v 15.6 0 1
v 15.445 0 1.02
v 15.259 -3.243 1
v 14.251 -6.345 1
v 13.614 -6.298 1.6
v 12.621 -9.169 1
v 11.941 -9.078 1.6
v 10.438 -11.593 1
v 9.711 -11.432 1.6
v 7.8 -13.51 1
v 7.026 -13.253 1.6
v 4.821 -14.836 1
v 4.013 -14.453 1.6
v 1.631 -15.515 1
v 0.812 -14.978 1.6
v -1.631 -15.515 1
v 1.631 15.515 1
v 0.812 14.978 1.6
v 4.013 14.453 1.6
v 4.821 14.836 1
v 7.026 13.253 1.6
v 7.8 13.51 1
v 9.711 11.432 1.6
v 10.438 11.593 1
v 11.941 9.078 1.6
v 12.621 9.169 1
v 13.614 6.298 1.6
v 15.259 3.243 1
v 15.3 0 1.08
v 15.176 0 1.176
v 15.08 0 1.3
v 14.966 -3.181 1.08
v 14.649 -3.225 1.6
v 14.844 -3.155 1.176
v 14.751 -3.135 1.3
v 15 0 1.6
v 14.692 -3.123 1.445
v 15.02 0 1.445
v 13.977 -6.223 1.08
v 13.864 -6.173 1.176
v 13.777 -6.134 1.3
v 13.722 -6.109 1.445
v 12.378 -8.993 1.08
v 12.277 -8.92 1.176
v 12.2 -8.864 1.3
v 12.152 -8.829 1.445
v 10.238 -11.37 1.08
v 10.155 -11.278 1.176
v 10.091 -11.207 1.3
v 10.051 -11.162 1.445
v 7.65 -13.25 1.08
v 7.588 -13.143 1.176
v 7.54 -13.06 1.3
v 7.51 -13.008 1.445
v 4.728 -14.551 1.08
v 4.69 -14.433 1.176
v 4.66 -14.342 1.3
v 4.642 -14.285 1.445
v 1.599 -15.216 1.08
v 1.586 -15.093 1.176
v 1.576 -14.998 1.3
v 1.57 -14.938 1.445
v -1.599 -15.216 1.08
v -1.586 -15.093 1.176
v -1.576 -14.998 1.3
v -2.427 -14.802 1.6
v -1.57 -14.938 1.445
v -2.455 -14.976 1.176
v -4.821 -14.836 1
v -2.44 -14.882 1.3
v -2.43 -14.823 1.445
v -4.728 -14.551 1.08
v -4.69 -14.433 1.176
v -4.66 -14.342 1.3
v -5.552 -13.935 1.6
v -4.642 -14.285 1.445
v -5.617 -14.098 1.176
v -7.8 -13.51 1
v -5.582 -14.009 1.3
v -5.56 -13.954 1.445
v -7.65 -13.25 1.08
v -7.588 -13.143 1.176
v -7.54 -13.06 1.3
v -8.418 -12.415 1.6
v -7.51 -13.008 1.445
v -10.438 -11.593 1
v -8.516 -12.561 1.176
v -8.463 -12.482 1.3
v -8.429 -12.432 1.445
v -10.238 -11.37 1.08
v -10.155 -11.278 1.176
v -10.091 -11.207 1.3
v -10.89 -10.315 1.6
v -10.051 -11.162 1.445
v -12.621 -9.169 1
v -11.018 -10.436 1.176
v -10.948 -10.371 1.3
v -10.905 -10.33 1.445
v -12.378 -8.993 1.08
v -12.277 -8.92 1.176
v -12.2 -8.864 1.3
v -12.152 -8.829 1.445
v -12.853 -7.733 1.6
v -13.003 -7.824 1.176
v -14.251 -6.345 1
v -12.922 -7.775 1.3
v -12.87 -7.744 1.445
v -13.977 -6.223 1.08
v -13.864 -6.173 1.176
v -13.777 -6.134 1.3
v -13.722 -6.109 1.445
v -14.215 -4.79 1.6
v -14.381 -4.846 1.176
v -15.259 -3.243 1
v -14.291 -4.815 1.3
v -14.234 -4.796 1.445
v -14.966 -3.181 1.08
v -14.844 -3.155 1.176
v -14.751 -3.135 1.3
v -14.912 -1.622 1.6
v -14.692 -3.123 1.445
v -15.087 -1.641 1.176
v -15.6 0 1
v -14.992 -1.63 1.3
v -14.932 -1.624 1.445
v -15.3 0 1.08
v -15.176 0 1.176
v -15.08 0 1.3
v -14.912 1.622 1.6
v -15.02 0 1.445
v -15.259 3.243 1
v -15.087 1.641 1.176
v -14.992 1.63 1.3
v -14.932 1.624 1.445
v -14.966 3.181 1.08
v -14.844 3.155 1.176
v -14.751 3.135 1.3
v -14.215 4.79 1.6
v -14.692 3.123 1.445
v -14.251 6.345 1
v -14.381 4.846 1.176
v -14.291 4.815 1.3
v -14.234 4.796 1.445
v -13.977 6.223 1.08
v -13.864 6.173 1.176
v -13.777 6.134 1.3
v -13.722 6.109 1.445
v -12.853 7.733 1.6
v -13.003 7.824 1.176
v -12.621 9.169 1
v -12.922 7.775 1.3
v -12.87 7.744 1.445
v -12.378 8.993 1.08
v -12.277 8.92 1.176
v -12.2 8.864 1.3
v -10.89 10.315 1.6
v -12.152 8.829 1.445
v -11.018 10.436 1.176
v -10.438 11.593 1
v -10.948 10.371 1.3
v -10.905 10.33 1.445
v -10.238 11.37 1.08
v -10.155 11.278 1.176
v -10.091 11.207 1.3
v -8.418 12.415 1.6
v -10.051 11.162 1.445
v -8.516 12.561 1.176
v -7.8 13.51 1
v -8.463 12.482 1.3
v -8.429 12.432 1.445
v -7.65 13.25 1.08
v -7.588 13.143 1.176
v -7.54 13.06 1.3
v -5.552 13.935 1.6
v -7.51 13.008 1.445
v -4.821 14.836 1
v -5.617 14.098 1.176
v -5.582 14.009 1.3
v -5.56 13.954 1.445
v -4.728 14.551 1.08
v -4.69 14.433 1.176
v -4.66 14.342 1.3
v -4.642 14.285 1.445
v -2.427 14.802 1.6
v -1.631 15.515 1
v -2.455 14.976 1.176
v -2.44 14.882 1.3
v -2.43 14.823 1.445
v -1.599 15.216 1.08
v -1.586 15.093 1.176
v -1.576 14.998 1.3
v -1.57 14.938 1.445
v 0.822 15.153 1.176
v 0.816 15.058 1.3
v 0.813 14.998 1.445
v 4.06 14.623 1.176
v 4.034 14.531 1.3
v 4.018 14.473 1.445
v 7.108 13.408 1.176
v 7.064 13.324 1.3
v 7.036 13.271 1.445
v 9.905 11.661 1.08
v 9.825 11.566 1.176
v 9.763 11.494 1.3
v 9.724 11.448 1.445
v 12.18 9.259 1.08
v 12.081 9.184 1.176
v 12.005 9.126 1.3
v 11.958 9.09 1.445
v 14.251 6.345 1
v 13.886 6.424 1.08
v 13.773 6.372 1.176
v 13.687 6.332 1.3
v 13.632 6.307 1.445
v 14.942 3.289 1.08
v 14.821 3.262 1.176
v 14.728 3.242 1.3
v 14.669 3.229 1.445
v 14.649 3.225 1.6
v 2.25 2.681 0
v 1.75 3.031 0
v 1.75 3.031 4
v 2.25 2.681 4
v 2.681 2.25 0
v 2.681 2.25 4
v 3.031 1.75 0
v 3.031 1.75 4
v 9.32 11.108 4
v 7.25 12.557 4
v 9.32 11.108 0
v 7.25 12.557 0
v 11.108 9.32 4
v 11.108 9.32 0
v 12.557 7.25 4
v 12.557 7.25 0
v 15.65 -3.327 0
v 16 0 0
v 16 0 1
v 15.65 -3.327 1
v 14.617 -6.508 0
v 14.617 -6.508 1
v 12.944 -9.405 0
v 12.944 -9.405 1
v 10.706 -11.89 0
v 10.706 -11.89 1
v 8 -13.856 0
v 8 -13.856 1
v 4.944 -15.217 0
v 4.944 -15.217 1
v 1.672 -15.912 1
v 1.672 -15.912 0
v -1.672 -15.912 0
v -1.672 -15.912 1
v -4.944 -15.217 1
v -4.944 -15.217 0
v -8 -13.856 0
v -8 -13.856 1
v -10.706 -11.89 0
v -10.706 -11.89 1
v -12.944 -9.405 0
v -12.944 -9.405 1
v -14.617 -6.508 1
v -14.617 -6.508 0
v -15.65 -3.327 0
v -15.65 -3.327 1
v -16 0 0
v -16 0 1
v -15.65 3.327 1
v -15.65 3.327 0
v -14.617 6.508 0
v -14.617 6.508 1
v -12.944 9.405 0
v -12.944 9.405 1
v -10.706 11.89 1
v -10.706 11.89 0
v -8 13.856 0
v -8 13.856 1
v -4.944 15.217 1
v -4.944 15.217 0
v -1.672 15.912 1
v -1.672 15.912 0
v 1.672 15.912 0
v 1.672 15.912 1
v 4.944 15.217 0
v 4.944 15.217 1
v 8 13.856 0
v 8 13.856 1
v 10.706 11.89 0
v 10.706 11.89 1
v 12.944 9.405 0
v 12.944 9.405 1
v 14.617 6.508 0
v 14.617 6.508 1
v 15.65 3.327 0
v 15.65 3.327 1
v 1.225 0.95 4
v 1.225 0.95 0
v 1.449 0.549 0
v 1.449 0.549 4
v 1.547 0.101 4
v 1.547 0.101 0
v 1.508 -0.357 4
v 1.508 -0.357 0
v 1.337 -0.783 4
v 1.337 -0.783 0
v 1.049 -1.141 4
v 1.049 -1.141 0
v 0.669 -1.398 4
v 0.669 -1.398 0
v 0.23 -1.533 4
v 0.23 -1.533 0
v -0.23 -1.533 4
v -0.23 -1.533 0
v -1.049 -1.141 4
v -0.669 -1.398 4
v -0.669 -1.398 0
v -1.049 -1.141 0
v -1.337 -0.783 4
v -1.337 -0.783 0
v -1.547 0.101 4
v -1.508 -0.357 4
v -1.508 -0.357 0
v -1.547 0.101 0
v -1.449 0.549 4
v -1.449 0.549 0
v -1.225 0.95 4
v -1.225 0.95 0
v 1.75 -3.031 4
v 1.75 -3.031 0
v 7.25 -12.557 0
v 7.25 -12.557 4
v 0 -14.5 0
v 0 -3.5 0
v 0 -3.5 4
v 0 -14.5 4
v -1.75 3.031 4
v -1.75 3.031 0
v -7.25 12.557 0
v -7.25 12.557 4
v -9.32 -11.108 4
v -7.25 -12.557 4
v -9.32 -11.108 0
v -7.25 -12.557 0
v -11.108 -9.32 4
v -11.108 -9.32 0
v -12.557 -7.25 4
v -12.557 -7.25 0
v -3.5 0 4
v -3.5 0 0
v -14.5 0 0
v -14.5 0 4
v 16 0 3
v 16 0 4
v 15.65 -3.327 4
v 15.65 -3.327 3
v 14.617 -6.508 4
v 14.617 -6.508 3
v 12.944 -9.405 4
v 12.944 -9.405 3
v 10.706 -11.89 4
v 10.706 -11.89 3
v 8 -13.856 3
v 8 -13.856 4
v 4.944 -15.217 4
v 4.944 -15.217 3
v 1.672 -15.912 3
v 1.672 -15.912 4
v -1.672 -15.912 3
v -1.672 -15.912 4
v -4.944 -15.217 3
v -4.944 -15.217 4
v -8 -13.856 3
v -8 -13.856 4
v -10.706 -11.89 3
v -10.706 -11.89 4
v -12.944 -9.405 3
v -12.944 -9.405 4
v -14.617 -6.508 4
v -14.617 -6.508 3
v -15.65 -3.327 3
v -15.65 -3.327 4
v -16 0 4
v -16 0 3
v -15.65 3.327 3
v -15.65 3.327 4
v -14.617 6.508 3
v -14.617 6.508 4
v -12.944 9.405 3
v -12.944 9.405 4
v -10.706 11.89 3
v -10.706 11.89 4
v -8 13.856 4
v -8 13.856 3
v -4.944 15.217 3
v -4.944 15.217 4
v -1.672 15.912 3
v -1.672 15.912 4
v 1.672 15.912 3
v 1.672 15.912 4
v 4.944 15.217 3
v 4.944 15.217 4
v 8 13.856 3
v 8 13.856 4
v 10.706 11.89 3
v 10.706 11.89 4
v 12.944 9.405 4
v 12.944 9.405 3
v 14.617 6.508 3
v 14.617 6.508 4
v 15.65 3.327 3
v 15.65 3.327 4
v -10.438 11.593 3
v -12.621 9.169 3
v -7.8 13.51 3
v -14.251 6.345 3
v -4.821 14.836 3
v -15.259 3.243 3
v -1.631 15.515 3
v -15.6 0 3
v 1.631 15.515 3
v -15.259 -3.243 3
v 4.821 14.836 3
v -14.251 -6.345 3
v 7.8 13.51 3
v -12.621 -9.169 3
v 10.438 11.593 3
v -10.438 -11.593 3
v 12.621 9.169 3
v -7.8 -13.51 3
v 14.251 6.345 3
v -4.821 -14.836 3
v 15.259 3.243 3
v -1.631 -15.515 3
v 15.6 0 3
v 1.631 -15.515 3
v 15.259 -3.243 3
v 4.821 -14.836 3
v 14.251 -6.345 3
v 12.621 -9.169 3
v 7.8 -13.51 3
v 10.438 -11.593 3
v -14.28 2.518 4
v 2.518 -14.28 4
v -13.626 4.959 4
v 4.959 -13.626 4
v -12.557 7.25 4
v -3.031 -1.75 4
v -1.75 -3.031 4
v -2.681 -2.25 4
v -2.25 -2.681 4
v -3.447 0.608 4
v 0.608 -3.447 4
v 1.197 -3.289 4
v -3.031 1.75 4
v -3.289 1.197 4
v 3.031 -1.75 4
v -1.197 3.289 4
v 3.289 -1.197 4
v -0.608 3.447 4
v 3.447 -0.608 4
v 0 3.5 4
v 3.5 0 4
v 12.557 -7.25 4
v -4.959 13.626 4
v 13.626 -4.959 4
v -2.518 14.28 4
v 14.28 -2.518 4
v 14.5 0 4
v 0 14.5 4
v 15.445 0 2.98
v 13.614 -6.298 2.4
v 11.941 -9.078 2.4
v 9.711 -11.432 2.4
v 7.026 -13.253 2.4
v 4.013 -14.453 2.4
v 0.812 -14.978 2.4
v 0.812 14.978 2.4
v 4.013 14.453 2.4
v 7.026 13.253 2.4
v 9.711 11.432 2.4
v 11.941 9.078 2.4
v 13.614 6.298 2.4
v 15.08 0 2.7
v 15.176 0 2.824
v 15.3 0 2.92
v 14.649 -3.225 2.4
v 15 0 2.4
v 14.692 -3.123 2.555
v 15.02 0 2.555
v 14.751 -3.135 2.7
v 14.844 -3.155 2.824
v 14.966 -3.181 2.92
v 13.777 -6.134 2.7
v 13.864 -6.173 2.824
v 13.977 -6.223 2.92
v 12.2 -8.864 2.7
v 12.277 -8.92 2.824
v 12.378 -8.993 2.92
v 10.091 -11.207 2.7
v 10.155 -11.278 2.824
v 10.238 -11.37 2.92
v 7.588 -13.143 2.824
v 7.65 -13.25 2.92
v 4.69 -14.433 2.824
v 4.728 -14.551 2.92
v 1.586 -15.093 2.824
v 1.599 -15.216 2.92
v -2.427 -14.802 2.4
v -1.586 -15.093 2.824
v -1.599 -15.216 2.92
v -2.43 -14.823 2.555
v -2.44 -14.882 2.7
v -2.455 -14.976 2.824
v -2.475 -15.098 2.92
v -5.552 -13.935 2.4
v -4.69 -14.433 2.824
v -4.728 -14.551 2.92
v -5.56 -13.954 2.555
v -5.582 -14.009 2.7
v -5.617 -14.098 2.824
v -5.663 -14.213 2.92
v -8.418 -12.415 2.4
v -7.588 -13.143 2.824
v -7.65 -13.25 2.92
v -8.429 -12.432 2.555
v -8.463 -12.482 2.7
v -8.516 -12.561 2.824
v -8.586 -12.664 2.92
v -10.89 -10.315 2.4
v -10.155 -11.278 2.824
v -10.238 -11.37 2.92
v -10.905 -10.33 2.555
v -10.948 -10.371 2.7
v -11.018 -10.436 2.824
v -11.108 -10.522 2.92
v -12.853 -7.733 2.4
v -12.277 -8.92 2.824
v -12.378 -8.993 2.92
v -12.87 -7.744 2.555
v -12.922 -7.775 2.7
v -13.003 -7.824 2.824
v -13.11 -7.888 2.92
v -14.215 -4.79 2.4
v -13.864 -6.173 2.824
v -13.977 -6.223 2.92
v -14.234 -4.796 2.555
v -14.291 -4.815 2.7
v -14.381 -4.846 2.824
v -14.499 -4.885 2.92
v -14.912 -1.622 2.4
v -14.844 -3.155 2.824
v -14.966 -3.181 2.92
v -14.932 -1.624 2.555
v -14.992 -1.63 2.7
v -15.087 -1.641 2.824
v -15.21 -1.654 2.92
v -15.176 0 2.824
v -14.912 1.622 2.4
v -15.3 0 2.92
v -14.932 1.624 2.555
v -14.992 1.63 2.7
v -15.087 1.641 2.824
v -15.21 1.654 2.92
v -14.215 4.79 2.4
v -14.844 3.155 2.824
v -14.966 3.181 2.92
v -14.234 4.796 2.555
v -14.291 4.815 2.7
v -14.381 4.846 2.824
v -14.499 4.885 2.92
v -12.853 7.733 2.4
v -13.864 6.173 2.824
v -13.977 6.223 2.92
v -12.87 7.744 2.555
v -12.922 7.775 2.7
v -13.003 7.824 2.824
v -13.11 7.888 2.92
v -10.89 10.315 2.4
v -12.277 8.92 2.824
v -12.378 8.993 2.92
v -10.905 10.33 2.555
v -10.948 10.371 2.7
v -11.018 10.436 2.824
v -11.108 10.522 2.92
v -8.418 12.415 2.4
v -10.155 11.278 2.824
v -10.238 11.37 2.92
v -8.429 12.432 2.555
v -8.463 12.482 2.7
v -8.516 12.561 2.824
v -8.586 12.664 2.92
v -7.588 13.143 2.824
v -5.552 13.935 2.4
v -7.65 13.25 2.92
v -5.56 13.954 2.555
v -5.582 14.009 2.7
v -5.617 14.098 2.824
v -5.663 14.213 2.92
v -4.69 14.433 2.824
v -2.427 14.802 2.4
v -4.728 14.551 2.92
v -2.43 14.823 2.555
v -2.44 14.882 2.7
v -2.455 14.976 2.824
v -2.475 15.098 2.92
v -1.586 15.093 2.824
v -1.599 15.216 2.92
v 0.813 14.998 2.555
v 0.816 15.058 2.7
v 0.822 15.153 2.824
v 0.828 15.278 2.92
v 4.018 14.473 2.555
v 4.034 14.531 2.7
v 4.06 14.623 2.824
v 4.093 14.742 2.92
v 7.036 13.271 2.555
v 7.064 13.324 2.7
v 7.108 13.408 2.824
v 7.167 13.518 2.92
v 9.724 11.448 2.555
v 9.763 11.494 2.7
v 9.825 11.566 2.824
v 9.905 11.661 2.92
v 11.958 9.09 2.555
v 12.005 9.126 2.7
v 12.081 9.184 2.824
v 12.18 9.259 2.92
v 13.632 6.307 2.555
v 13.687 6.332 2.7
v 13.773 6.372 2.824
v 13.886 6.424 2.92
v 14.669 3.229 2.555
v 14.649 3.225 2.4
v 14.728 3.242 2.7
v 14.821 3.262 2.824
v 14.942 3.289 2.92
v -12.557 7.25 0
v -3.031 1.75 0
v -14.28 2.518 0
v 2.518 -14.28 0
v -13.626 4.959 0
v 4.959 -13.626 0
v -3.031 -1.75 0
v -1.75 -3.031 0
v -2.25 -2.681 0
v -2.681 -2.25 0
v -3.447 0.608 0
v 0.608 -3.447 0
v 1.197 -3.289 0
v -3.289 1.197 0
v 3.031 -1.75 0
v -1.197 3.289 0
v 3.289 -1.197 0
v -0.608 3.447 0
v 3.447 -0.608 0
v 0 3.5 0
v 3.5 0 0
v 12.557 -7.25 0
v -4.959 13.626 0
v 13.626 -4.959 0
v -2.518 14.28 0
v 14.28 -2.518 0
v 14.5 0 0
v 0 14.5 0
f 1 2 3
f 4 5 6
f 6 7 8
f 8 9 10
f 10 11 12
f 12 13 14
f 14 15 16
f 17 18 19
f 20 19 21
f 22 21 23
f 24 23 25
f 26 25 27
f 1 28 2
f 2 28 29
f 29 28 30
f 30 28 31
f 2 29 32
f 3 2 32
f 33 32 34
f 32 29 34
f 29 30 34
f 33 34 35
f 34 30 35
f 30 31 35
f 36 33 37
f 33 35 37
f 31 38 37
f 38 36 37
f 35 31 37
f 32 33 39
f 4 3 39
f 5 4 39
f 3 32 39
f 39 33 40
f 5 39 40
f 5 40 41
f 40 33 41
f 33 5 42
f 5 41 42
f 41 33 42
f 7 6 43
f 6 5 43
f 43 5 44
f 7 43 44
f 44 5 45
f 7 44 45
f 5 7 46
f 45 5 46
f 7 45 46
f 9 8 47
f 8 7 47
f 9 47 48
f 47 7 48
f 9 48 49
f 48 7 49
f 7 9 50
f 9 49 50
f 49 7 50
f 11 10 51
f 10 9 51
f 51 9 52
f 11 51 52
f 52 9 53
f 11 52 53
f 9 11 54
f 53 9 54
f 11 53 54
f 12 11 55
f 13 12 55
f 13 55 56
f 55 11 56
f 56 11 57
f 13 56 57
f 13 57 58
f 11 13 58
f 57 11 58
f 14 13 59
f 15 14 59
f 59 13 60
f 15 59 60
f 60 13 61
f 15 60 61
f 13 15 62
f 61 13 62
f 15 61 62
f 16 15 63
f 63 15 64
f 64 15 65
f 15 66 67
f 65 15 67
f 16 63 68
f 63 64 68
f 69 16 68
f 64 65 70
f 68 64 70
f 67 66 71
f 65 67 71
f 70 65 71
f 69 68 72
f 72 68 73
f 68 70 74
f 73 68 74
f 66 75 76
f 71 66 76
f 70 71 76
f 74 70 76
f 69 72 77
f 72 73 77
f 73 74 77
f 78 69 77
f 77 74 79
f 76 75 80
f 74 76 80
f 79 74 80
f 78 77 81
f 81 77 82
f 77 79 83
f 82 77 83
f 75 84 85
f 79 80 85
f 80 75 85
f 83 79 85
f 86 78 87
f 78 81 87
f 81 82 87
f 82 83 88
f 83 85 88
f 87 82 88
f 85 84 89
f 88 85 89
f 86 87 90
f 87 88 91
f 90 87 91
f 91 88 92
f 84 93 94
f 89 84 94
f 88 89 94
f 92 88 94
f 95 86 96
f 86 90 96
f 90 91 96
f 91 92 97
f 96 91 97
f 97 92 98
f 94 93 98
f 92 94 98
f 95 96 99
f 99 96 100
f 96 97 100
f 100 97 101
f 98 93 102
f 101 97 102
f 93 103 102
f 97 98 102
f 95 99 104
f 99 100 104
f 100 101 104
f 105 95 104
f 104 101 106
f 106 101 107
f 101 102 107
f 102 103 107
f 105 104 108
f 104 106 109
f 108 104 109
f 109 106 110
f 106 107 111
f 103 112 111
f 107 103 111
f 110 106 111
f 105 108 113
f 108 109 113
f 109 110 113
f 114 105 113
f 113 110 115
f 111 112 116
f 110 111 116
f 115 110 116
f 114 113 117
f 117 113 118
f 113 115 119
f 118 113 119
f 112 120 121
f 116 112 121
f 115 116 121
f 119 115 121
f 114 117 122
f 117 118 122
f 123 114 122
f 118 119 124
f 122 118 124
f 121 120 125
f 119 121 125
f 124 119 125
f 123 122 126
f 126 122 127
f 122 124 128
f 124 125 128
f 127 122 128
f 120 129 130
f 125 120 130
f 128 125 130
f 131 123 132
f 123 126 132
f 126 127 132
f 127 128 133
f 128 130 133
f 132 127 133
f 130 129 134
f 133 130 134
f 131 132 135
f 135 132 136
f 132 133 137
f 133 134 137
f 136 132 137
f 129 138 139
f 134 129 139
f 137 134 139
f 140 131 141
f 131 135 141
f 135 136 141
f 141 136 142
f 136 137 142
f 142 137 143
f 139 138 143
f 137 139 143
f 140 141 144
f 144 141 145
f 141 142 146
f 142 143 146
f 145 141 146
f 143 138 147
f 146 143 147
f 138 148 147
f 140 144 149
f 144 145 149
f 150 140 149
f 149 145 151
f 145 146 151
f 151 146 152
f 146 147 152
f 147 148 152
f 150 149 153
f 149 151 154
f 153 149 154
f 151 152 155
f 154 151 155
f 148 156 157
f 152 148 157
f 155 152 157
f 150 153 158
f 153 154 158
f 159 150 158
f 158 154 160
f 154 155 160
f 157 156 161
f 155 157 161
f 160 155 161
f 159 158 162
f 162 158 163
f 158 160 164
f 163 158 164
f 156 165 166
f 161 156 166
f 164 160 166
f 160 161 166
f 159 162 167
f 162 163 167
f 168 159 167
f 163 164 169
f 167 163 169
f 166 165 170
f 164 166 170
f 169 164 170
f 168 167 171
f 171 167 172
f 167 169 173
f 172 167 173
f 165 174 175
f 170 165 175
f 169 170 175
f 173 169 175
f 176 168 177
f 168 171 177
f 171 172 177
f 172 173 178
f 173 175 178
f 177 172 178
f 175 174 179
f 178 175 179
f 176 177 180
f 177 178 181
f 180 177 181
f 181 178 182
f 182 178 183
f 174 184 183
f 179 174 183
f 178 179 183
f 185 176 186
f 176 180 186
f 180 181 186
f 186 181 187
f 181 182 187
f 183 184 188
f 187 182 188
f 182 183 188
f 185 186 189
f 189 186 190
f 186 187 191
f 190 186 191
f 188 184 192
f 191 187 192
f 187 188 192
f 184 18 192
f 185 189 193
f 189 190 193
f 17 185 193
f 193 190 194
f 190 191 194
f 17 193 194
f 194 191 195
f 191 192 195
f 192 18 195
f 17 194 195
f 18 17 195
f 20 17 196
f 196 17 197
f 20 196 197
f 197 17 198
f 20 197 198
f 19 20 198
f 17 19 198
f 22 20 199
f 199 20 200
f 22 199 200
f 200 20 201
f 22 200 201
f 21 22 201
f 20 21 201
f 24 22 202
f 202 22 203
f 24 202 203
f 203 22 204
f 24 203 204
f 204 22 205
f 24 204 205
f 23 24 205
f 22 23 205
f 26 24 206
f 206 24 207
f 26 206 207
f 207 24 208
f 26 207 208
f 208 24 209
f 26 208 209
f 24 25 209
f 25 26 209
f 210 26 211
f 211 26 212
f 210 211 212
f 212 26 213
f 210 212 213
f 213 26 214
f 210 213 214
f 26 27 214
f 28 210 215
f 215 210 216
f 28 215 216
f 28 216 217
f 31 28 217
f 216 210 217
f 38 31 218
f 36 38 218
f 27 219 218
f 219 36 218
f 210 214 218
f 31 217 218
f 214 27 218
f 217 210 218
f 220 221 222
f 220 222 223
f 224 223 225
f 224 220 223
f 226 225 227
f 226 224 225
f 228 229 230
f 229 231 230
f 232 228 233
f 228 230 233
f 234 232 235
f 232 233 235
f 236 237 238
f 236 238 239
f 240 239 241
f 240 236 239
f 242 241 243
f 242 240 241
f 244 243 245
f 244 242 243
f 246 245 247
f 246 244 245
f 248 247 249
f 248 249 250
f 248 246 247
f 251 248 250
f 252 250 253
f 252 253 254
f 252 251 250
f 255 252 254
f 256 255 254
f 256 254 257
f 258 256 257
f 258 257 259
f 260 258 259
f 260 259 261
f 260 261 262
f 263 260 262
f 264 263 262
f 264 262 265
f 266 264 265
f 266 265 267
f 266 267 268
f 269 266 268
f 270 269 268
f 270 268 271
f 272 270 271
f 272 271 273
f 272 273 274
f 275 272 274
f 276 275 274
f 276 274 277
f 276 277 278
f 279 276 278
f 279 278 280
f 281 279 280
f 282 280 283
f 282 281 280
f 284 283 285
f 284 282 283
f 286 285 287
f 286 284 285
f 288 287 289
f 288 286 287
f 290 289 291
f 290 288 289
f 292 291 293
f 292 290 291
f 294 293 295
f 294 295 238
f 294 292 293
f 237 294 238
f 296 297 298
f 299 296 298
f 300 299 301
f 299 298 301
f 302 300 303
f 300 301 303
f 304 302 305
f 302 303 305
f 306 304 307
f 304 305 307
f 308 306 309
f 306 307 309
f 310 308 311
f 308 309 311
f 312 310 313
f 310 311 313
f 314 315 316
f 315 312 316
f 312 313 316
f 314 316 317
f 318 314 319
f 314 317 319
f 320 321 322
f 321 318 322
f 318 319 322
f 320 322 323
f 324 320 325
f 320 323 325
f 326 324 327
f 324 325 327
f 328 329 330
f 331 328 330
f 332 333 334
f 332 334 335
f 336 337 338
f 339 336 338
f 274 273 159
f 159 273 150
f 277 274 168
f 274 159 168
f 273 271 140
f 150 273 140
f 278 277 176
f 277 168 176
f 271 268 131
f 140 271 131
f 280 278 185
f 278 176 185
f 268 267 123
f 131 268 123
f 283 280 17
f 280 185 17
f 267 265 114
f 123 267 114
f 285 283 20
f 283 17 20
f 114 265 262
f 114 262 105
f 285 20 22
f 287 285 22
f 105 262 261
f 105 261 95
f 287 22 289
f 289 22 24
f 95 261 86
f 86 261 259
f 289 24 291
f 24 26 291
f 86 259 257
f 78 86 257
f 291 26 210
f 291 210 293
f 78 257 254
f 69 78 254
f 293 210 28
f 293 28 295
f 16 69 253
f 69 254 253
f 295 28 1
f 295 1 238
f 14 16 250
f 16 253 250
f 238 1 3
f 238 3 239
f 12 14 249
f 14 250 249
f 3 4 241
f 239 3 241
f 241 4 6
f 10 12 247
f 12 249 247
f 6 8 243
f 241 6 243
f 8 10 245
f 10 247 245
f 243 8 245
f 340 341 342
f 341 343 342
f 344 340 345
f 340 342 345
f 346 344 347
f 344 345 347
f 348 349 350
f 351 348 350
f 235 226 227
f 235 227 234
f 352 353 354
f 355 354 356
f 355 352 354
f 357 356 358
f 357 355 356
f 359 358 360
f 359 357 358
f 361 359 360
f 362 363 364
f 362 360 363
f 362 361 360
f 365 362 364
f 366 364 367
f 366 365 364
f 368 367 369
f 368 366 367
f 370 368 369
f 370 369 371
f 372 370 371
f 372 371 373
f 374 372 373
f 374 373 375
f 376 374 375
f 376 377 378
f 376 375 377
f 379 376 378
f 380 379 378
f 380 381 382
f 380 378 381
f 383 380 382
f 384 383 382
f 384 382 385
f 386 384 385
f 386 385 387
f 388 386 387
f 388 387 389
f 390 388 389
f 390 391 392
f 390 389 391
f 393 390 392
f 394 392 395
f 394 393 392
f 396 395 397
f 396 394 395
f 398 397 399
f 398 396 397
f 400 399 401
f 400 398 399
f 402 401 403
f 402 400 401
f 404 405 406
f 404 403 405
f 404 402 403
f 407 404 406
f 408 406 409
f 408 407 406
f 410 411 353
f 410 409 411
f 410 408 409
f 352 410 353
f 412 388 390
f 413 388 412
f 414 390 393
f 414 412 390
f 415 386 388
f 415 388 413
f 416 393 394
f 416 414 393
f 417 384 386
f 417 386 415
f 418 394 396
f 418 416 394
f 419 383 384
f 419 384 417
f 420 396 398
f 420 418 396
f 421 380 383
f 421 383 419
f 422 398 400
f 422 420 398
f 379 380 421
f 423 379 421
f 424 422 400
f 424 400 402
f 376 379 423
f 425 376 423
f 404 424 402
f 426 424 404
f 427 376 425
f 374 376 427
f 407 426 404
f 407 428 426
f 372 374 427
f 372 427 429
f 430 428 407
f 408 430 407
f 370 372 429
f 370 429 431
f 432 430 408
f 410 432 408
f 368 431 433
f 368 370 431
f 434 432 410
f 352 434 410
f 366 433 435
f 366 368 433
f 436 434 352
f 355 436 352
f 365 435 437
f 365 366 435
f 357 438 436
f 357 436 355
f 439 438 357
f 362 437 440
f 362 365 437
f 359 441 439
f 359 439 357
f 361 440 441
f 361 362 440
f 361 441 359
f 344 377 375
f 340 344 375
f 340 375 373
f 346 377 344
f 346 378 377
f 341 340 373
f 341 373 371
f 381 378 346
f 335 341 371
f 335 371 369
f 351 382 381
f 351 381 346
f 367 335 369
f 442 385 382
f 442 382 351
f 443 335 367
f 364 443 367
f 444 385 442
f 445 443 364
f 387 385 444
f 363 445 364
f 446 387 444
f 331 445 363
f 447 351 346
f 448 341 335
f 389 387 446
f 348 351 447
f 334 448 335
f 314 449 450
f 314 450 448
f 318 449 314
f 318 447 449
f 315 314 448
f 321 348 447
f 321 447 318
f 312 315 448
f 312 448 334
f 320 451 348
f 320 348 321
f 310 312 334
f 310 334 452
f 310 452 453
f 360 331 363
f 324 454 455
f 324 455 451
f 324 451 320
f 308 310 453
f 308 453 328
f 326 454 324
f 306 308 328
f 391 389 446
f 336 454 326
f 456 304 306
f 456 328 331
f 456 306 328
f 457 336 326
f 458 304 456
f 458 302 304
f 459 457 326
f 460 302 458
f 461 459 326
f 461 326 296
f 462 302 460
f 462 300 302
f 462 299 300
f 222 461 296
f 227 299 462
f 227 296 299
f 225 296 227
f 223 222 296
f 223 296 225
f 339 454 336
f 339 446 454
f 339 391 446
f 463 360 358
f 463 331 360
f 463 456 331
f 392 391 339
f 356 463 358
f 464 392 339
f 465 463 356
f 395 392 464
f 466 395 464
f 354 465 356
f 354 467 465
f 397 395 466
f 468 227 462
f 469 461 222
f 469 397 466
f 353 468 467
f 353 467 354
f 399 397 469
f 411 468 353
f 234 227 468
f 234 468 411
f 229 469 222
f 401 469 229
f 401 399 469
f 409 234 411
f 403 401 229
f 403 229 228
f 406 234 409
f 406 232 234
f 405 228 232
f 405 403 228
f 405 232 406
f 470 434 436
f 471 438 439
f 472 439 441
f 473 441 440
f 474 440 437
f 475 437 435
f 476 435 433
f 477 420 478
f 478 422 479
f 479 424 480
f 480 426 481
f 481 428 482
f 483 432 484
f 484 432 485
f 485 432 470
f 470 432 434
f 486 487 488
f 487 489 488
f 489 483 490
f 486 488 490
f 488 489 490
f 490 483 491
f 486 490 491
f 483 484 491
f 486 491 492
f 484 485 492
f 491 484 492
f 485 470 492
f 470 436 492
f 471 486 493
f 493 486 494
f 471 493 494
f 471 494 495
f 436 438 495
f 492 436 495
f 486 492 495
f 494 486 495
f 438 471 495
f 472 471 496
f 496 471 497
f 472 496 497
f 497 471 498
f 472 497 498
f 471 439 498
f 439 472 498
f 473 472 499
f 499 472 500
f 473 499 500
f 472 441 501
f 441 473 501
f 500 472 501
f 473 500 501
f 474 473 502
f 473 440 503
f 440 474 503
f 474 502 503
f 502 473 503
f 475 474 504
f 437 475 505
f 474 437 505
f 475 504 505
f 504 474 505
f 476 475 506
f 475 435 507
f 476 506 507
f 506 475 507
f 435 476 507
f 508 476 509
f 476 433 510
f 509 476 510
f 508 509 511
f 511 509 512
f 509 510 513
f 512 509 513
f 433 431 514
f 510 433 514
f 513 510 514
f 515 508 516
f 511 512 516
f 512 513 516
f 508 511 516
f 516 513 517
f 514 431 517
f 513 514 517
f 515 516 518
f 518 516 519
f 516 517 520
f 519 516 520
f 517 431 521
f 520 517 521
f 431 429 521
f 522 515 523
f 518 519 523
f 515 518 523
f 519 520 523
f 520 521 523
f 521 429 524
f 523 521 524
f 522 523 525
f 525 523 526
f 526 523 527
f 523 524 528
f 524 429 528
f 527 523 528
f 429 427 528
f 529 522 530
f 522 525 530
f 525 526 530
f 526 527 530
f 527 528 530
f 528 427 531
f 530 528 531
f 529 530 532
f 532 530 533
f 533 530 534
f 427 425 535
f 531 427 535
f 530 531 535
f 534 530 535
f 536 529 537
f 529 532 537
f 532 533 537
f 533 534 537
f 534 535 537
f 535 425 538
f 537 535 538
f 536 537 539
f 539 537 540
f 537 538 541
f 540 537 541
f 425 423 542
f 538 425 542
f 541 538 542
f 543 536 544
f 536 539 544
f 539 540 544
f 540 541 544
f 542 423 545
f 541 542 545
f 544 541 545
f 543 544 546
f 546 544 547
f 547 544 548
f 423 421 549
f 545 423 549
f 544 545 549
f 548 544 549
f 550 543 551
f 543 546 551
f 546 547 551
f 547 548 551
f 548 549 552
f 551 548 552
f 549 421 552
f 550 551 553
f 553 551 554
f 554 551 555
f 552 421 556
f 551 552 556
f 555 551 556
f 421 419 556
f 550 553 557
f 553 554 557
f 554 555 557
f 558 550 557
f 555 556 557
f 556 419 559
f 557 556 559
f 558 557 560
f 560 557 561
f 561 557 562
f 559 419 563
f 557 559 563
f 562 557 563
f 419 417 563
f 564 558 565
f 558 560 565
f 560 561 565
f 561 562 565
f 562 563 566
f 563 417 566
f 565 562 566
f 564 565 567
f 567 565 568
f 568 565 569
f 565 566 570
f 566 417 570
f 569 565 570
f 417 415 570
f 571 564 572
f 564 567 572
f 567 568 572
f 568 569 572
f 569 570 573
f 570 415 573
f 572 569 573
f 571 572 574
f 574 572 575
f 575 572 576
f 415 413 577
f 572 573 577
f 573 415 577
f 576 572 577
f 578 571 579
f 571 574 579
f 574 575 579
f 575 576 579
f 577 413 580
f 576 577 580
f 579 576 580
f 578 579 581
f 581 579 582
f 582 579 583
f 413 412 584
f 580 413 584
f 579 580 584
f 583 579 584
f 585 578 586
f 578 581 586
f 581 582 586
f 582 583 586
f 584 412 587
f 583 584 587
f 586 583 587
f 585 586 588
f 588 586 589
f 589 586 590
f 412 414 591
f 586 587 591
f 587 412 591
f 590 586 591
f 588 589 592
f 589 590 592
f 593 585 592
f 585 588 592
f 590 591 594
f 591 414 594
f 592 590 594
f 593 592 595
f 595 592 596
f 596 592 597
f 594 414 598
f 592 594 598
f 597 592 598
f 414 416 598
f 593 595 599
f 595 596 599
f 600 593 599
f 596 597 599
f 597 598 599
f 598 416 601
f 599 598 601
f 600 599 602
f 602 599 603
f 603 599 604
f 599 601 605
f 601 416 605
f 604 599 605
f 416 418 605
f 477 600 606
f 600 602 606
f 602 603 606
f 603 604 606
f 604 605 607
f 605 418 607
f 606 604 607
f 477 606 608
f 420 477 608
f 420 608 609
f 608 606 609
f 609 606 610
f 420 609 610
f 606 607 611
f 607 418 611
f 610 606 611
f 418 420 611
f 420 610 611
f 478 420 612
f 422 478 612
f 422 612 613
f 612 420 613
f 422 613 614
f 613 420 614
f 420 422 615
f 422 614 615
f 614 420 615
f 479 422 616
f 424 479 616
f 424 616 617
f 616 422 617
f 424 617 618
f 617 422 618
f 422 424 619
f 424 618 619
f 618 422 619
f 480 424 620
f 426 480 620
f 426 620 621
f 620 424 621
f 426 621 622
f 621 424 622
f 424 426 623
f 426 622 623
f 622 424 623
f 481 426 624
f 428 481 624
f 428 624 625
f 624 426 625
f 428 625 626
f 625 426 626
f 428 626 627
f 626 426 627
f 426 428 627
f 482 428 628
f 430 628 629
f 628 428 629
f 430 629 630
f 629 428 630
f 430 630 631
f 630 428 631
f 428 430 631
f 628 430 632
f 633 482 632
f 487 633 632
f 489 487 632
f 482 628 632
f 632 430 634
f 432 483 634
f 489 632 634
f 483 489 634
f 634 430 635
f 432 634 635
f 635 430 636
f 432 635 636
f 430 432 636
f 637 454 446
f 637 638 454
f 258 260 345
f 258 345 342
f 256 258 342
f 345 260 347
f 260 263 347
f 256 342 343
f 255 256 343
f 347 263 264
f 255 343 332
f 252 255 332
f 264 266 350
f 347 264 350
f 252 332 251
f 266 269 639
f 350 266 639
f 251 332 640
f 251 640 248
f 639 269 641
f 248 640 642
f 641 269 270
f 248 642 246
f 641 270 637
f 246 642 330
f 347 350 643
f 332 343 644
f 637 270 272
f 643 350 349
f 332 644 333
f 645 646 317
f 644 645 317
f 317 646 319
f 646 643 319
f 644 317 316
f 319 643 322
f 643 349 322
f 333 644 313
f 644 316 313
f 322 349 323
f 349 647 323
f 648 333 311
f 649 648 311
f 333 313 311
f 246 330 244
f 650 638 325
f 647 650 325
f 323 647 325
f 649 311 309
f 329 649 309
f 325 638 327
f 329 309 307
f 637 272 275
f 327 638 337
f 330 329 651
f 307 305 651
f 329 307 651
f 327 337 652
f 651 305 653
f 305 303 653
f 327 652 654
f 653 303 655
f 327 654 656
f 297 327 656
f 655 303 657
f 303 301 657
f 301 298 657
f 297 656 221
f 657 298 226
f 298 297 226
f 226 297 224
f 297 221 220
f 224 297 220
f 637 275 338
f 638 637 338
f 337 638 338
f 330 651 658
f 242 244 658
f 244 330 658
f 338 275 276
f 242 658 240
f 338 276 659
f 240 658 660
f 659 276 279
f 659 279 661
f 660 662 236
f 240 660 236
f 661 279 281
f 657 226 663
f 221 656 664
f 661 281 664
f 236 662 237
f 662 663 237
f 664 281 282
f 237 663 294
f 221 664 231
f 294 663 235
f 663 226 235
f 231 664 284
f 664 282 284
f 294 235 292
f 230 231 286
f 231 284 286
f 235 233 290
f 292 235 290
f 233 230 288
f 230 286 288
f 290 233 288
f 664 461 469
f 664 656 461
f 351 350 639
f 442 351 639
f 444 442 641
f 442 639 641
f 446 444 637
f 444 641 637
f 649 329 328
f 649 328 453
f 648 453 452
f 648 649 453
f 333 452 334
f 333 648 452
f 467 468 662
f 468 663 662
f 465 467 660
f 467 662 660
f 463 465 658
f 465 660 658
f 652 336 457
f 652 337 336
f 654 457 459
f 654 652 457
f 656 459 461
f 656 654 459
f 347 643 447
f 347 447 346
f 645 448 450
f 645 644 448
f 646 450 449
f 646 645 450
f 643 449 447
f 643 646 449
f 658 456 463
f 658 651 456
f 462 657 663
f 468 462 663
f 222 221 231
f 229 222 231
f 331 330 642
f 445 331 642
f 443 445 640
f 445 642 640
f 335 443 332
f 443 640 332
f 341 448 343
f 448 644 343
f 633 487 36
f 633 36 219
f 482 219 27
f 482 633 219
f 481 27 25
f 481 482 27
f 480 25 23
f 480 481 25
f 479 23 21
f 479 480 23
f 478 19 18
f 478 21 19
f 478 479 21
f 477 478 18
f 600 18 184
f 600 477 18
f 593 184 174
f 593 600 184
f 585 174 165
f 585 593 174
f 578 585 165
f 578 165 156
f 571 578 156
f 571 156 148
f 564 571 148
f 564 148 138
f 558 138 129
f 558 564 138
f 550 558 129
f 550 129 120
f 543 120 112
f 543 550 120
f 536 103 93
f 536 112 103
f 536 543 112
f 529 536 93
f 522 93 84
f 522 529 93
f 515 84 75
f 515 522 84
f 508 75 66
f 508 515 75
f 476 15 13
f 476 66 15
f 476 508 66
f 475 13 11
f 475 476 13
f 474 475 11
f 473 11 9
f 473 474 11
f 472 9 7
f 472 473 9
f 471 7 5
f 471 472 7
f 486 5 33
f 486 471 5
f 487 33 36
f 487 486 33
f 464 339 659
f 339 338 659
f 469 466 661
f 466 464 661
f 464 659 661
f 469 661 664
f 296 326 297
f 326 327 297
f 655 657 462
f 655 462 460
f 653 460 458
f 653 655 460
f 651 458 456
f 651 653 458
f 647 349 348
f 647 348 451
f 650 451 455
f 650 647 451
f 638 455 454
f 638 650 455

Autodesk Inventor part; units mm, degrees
ref_plane "YZ Plane" through (0, 0, 0) normal (1, 0, 0) x (0, 1, 0)
ref_plane "XZ Plane" through (0, 0, 0) normal (0, 1, 0) x (-1, 0, 0)
ref_plane "XY Plane" through (0, 0, 0) normal (0, 0, 1) x (1, 0, 0)
sketch "Sketch1" plane through (0, 0, 0) normal (0, 0, 1) x (1, 0, 0)
  circle A0 centre (0, 0) radius 16
  arc A1 (-1.2247, 0.95) -> (1.2247, 0.95) centre (0, 0) ccw
  line L0 (-1.2247, 0.95) -> (1.2247, 0.95)
  line L1 (-3.5, 0) -> (-14.5, 0)
  line L2 (-3.0311, -1.75) -> (-12.5574, -7.25)
  line L3 (-1.75, -3.0311) -> (-7.25, -12.5574)
  line L4 (0, -3.5) -> (0, -14.5)
  line L5 (1.75, -3.0311) -> (7.25, -12.5574)
  line L6 (3.0311, -1.75) -> (12.5574, -7.25)
  line L7 (3.5, 0) -> (14.5, 0)
  line L8 (3.0311, 1.75) -> (12.5574, 7.25)
  line L9 (1.75, 3.0311) -> (7.25, 12.5574)
  line L10 (0, 3.5) -> (0, 14.5)
  line L11 (-1.75, 3.0311) -> (-7.25, 12.5574)
  line L12 (-3.0311, 1.75) -> (-12.5574, 7.25)
  arc A2 (-3.0311, -1.75) -> (-1.75, -3.0311) centre (0, 0) ccw
  arc A3 (0, -3.5) -> (1.75, -3.0311) centre (0, 0) ccw
  arc A4 (3.0311, -1.75) -> (3.5, 0) centre (0, 0) ccw
  arc A5 (3.0311, 1.75) -> (1.75, 3.0311) centre (0, 0) ccw
  arc A6 (0, 3.5) -> (-1.75, 3.0311) centre (0, 0) ccw
  arc A7 (-3.0311, 1.75) -> (-3.5, 0) centre (0, 0) ccw
  arc A8 (-12.5574, -7.25) -> (-7.25, -12.5574) centre (0, 0) ccw
  arc A9 (0, -14.5) -> (7.25, -12.5574) centre (0, 0) ccw
  arc A10 (12.5574, -7.25) -> (14.5, 0) centre (0, 0) ccw
  arc A11 (12.5574, 7.25) -> (7.25, 12.5574) centre (0, 0) ccw
  arc A12 (0, 14.5) -> (-7.25, 12.5574) centre (0, 0) ccw
  arc A13 (-12.5574, 7.25) -> (-14.5, 0) centre (0, 0) ccw
  dimension "d0" = 32
  dimension "d1" = 3.1
  dimension "d2" = 0.95
  dimension "d18" = 360
  dimension "d20" = 14.5
extrude "Extrusion1" add sketch "Sketch1" along normal blind 4
ref_plane "Work Plane3" through (-1.2247, 0, 0) normal (0, -1, 0) x (1, 0, 0)
sketch "Sketch4" plane through (-1.2247, 0, 0) normal (0, -1, 0) x (1, 0, 0)
  line L0 (17.2247, 4) -> (-14.7753, 4) projected
  line L1 (-14.7753, 0) -> (17.2247, 0) projected
  line L2 (17.2247, 4) -> (-14.7753, 4) construction
  line L3 (1.2247, 4) -> (1.2247, 0) construction
  line L4 (16.2247, 3) -> (17.2247, 3)
  line L5 (17.2247, 3) -> (17.2247, 1)
  line L6 (17.2247, 1) -> (16.2247, 1)
  line L7 (16.2247, 1) -> (16.2247, 3)
  line L8 (17.2247, 0) -> (17.2247, 4) projected
  line L9 (16.2247, 1) -> (16.2247, 0) construction
  line L10 (16.2247, 3) -> (16.2247, 4) construction
  dimension "d10" = 1
  dimension "d11" = 1
revolve "Revolution1" cut sketch "Sketch4" angle 360 about axis through (0, 0, 4) along (0, 0, -1)
fillet "Fillet1" radius 0.6 2 edges at (-15, 0, 3) (-15, 0, 1)
properties part number "wheel"
